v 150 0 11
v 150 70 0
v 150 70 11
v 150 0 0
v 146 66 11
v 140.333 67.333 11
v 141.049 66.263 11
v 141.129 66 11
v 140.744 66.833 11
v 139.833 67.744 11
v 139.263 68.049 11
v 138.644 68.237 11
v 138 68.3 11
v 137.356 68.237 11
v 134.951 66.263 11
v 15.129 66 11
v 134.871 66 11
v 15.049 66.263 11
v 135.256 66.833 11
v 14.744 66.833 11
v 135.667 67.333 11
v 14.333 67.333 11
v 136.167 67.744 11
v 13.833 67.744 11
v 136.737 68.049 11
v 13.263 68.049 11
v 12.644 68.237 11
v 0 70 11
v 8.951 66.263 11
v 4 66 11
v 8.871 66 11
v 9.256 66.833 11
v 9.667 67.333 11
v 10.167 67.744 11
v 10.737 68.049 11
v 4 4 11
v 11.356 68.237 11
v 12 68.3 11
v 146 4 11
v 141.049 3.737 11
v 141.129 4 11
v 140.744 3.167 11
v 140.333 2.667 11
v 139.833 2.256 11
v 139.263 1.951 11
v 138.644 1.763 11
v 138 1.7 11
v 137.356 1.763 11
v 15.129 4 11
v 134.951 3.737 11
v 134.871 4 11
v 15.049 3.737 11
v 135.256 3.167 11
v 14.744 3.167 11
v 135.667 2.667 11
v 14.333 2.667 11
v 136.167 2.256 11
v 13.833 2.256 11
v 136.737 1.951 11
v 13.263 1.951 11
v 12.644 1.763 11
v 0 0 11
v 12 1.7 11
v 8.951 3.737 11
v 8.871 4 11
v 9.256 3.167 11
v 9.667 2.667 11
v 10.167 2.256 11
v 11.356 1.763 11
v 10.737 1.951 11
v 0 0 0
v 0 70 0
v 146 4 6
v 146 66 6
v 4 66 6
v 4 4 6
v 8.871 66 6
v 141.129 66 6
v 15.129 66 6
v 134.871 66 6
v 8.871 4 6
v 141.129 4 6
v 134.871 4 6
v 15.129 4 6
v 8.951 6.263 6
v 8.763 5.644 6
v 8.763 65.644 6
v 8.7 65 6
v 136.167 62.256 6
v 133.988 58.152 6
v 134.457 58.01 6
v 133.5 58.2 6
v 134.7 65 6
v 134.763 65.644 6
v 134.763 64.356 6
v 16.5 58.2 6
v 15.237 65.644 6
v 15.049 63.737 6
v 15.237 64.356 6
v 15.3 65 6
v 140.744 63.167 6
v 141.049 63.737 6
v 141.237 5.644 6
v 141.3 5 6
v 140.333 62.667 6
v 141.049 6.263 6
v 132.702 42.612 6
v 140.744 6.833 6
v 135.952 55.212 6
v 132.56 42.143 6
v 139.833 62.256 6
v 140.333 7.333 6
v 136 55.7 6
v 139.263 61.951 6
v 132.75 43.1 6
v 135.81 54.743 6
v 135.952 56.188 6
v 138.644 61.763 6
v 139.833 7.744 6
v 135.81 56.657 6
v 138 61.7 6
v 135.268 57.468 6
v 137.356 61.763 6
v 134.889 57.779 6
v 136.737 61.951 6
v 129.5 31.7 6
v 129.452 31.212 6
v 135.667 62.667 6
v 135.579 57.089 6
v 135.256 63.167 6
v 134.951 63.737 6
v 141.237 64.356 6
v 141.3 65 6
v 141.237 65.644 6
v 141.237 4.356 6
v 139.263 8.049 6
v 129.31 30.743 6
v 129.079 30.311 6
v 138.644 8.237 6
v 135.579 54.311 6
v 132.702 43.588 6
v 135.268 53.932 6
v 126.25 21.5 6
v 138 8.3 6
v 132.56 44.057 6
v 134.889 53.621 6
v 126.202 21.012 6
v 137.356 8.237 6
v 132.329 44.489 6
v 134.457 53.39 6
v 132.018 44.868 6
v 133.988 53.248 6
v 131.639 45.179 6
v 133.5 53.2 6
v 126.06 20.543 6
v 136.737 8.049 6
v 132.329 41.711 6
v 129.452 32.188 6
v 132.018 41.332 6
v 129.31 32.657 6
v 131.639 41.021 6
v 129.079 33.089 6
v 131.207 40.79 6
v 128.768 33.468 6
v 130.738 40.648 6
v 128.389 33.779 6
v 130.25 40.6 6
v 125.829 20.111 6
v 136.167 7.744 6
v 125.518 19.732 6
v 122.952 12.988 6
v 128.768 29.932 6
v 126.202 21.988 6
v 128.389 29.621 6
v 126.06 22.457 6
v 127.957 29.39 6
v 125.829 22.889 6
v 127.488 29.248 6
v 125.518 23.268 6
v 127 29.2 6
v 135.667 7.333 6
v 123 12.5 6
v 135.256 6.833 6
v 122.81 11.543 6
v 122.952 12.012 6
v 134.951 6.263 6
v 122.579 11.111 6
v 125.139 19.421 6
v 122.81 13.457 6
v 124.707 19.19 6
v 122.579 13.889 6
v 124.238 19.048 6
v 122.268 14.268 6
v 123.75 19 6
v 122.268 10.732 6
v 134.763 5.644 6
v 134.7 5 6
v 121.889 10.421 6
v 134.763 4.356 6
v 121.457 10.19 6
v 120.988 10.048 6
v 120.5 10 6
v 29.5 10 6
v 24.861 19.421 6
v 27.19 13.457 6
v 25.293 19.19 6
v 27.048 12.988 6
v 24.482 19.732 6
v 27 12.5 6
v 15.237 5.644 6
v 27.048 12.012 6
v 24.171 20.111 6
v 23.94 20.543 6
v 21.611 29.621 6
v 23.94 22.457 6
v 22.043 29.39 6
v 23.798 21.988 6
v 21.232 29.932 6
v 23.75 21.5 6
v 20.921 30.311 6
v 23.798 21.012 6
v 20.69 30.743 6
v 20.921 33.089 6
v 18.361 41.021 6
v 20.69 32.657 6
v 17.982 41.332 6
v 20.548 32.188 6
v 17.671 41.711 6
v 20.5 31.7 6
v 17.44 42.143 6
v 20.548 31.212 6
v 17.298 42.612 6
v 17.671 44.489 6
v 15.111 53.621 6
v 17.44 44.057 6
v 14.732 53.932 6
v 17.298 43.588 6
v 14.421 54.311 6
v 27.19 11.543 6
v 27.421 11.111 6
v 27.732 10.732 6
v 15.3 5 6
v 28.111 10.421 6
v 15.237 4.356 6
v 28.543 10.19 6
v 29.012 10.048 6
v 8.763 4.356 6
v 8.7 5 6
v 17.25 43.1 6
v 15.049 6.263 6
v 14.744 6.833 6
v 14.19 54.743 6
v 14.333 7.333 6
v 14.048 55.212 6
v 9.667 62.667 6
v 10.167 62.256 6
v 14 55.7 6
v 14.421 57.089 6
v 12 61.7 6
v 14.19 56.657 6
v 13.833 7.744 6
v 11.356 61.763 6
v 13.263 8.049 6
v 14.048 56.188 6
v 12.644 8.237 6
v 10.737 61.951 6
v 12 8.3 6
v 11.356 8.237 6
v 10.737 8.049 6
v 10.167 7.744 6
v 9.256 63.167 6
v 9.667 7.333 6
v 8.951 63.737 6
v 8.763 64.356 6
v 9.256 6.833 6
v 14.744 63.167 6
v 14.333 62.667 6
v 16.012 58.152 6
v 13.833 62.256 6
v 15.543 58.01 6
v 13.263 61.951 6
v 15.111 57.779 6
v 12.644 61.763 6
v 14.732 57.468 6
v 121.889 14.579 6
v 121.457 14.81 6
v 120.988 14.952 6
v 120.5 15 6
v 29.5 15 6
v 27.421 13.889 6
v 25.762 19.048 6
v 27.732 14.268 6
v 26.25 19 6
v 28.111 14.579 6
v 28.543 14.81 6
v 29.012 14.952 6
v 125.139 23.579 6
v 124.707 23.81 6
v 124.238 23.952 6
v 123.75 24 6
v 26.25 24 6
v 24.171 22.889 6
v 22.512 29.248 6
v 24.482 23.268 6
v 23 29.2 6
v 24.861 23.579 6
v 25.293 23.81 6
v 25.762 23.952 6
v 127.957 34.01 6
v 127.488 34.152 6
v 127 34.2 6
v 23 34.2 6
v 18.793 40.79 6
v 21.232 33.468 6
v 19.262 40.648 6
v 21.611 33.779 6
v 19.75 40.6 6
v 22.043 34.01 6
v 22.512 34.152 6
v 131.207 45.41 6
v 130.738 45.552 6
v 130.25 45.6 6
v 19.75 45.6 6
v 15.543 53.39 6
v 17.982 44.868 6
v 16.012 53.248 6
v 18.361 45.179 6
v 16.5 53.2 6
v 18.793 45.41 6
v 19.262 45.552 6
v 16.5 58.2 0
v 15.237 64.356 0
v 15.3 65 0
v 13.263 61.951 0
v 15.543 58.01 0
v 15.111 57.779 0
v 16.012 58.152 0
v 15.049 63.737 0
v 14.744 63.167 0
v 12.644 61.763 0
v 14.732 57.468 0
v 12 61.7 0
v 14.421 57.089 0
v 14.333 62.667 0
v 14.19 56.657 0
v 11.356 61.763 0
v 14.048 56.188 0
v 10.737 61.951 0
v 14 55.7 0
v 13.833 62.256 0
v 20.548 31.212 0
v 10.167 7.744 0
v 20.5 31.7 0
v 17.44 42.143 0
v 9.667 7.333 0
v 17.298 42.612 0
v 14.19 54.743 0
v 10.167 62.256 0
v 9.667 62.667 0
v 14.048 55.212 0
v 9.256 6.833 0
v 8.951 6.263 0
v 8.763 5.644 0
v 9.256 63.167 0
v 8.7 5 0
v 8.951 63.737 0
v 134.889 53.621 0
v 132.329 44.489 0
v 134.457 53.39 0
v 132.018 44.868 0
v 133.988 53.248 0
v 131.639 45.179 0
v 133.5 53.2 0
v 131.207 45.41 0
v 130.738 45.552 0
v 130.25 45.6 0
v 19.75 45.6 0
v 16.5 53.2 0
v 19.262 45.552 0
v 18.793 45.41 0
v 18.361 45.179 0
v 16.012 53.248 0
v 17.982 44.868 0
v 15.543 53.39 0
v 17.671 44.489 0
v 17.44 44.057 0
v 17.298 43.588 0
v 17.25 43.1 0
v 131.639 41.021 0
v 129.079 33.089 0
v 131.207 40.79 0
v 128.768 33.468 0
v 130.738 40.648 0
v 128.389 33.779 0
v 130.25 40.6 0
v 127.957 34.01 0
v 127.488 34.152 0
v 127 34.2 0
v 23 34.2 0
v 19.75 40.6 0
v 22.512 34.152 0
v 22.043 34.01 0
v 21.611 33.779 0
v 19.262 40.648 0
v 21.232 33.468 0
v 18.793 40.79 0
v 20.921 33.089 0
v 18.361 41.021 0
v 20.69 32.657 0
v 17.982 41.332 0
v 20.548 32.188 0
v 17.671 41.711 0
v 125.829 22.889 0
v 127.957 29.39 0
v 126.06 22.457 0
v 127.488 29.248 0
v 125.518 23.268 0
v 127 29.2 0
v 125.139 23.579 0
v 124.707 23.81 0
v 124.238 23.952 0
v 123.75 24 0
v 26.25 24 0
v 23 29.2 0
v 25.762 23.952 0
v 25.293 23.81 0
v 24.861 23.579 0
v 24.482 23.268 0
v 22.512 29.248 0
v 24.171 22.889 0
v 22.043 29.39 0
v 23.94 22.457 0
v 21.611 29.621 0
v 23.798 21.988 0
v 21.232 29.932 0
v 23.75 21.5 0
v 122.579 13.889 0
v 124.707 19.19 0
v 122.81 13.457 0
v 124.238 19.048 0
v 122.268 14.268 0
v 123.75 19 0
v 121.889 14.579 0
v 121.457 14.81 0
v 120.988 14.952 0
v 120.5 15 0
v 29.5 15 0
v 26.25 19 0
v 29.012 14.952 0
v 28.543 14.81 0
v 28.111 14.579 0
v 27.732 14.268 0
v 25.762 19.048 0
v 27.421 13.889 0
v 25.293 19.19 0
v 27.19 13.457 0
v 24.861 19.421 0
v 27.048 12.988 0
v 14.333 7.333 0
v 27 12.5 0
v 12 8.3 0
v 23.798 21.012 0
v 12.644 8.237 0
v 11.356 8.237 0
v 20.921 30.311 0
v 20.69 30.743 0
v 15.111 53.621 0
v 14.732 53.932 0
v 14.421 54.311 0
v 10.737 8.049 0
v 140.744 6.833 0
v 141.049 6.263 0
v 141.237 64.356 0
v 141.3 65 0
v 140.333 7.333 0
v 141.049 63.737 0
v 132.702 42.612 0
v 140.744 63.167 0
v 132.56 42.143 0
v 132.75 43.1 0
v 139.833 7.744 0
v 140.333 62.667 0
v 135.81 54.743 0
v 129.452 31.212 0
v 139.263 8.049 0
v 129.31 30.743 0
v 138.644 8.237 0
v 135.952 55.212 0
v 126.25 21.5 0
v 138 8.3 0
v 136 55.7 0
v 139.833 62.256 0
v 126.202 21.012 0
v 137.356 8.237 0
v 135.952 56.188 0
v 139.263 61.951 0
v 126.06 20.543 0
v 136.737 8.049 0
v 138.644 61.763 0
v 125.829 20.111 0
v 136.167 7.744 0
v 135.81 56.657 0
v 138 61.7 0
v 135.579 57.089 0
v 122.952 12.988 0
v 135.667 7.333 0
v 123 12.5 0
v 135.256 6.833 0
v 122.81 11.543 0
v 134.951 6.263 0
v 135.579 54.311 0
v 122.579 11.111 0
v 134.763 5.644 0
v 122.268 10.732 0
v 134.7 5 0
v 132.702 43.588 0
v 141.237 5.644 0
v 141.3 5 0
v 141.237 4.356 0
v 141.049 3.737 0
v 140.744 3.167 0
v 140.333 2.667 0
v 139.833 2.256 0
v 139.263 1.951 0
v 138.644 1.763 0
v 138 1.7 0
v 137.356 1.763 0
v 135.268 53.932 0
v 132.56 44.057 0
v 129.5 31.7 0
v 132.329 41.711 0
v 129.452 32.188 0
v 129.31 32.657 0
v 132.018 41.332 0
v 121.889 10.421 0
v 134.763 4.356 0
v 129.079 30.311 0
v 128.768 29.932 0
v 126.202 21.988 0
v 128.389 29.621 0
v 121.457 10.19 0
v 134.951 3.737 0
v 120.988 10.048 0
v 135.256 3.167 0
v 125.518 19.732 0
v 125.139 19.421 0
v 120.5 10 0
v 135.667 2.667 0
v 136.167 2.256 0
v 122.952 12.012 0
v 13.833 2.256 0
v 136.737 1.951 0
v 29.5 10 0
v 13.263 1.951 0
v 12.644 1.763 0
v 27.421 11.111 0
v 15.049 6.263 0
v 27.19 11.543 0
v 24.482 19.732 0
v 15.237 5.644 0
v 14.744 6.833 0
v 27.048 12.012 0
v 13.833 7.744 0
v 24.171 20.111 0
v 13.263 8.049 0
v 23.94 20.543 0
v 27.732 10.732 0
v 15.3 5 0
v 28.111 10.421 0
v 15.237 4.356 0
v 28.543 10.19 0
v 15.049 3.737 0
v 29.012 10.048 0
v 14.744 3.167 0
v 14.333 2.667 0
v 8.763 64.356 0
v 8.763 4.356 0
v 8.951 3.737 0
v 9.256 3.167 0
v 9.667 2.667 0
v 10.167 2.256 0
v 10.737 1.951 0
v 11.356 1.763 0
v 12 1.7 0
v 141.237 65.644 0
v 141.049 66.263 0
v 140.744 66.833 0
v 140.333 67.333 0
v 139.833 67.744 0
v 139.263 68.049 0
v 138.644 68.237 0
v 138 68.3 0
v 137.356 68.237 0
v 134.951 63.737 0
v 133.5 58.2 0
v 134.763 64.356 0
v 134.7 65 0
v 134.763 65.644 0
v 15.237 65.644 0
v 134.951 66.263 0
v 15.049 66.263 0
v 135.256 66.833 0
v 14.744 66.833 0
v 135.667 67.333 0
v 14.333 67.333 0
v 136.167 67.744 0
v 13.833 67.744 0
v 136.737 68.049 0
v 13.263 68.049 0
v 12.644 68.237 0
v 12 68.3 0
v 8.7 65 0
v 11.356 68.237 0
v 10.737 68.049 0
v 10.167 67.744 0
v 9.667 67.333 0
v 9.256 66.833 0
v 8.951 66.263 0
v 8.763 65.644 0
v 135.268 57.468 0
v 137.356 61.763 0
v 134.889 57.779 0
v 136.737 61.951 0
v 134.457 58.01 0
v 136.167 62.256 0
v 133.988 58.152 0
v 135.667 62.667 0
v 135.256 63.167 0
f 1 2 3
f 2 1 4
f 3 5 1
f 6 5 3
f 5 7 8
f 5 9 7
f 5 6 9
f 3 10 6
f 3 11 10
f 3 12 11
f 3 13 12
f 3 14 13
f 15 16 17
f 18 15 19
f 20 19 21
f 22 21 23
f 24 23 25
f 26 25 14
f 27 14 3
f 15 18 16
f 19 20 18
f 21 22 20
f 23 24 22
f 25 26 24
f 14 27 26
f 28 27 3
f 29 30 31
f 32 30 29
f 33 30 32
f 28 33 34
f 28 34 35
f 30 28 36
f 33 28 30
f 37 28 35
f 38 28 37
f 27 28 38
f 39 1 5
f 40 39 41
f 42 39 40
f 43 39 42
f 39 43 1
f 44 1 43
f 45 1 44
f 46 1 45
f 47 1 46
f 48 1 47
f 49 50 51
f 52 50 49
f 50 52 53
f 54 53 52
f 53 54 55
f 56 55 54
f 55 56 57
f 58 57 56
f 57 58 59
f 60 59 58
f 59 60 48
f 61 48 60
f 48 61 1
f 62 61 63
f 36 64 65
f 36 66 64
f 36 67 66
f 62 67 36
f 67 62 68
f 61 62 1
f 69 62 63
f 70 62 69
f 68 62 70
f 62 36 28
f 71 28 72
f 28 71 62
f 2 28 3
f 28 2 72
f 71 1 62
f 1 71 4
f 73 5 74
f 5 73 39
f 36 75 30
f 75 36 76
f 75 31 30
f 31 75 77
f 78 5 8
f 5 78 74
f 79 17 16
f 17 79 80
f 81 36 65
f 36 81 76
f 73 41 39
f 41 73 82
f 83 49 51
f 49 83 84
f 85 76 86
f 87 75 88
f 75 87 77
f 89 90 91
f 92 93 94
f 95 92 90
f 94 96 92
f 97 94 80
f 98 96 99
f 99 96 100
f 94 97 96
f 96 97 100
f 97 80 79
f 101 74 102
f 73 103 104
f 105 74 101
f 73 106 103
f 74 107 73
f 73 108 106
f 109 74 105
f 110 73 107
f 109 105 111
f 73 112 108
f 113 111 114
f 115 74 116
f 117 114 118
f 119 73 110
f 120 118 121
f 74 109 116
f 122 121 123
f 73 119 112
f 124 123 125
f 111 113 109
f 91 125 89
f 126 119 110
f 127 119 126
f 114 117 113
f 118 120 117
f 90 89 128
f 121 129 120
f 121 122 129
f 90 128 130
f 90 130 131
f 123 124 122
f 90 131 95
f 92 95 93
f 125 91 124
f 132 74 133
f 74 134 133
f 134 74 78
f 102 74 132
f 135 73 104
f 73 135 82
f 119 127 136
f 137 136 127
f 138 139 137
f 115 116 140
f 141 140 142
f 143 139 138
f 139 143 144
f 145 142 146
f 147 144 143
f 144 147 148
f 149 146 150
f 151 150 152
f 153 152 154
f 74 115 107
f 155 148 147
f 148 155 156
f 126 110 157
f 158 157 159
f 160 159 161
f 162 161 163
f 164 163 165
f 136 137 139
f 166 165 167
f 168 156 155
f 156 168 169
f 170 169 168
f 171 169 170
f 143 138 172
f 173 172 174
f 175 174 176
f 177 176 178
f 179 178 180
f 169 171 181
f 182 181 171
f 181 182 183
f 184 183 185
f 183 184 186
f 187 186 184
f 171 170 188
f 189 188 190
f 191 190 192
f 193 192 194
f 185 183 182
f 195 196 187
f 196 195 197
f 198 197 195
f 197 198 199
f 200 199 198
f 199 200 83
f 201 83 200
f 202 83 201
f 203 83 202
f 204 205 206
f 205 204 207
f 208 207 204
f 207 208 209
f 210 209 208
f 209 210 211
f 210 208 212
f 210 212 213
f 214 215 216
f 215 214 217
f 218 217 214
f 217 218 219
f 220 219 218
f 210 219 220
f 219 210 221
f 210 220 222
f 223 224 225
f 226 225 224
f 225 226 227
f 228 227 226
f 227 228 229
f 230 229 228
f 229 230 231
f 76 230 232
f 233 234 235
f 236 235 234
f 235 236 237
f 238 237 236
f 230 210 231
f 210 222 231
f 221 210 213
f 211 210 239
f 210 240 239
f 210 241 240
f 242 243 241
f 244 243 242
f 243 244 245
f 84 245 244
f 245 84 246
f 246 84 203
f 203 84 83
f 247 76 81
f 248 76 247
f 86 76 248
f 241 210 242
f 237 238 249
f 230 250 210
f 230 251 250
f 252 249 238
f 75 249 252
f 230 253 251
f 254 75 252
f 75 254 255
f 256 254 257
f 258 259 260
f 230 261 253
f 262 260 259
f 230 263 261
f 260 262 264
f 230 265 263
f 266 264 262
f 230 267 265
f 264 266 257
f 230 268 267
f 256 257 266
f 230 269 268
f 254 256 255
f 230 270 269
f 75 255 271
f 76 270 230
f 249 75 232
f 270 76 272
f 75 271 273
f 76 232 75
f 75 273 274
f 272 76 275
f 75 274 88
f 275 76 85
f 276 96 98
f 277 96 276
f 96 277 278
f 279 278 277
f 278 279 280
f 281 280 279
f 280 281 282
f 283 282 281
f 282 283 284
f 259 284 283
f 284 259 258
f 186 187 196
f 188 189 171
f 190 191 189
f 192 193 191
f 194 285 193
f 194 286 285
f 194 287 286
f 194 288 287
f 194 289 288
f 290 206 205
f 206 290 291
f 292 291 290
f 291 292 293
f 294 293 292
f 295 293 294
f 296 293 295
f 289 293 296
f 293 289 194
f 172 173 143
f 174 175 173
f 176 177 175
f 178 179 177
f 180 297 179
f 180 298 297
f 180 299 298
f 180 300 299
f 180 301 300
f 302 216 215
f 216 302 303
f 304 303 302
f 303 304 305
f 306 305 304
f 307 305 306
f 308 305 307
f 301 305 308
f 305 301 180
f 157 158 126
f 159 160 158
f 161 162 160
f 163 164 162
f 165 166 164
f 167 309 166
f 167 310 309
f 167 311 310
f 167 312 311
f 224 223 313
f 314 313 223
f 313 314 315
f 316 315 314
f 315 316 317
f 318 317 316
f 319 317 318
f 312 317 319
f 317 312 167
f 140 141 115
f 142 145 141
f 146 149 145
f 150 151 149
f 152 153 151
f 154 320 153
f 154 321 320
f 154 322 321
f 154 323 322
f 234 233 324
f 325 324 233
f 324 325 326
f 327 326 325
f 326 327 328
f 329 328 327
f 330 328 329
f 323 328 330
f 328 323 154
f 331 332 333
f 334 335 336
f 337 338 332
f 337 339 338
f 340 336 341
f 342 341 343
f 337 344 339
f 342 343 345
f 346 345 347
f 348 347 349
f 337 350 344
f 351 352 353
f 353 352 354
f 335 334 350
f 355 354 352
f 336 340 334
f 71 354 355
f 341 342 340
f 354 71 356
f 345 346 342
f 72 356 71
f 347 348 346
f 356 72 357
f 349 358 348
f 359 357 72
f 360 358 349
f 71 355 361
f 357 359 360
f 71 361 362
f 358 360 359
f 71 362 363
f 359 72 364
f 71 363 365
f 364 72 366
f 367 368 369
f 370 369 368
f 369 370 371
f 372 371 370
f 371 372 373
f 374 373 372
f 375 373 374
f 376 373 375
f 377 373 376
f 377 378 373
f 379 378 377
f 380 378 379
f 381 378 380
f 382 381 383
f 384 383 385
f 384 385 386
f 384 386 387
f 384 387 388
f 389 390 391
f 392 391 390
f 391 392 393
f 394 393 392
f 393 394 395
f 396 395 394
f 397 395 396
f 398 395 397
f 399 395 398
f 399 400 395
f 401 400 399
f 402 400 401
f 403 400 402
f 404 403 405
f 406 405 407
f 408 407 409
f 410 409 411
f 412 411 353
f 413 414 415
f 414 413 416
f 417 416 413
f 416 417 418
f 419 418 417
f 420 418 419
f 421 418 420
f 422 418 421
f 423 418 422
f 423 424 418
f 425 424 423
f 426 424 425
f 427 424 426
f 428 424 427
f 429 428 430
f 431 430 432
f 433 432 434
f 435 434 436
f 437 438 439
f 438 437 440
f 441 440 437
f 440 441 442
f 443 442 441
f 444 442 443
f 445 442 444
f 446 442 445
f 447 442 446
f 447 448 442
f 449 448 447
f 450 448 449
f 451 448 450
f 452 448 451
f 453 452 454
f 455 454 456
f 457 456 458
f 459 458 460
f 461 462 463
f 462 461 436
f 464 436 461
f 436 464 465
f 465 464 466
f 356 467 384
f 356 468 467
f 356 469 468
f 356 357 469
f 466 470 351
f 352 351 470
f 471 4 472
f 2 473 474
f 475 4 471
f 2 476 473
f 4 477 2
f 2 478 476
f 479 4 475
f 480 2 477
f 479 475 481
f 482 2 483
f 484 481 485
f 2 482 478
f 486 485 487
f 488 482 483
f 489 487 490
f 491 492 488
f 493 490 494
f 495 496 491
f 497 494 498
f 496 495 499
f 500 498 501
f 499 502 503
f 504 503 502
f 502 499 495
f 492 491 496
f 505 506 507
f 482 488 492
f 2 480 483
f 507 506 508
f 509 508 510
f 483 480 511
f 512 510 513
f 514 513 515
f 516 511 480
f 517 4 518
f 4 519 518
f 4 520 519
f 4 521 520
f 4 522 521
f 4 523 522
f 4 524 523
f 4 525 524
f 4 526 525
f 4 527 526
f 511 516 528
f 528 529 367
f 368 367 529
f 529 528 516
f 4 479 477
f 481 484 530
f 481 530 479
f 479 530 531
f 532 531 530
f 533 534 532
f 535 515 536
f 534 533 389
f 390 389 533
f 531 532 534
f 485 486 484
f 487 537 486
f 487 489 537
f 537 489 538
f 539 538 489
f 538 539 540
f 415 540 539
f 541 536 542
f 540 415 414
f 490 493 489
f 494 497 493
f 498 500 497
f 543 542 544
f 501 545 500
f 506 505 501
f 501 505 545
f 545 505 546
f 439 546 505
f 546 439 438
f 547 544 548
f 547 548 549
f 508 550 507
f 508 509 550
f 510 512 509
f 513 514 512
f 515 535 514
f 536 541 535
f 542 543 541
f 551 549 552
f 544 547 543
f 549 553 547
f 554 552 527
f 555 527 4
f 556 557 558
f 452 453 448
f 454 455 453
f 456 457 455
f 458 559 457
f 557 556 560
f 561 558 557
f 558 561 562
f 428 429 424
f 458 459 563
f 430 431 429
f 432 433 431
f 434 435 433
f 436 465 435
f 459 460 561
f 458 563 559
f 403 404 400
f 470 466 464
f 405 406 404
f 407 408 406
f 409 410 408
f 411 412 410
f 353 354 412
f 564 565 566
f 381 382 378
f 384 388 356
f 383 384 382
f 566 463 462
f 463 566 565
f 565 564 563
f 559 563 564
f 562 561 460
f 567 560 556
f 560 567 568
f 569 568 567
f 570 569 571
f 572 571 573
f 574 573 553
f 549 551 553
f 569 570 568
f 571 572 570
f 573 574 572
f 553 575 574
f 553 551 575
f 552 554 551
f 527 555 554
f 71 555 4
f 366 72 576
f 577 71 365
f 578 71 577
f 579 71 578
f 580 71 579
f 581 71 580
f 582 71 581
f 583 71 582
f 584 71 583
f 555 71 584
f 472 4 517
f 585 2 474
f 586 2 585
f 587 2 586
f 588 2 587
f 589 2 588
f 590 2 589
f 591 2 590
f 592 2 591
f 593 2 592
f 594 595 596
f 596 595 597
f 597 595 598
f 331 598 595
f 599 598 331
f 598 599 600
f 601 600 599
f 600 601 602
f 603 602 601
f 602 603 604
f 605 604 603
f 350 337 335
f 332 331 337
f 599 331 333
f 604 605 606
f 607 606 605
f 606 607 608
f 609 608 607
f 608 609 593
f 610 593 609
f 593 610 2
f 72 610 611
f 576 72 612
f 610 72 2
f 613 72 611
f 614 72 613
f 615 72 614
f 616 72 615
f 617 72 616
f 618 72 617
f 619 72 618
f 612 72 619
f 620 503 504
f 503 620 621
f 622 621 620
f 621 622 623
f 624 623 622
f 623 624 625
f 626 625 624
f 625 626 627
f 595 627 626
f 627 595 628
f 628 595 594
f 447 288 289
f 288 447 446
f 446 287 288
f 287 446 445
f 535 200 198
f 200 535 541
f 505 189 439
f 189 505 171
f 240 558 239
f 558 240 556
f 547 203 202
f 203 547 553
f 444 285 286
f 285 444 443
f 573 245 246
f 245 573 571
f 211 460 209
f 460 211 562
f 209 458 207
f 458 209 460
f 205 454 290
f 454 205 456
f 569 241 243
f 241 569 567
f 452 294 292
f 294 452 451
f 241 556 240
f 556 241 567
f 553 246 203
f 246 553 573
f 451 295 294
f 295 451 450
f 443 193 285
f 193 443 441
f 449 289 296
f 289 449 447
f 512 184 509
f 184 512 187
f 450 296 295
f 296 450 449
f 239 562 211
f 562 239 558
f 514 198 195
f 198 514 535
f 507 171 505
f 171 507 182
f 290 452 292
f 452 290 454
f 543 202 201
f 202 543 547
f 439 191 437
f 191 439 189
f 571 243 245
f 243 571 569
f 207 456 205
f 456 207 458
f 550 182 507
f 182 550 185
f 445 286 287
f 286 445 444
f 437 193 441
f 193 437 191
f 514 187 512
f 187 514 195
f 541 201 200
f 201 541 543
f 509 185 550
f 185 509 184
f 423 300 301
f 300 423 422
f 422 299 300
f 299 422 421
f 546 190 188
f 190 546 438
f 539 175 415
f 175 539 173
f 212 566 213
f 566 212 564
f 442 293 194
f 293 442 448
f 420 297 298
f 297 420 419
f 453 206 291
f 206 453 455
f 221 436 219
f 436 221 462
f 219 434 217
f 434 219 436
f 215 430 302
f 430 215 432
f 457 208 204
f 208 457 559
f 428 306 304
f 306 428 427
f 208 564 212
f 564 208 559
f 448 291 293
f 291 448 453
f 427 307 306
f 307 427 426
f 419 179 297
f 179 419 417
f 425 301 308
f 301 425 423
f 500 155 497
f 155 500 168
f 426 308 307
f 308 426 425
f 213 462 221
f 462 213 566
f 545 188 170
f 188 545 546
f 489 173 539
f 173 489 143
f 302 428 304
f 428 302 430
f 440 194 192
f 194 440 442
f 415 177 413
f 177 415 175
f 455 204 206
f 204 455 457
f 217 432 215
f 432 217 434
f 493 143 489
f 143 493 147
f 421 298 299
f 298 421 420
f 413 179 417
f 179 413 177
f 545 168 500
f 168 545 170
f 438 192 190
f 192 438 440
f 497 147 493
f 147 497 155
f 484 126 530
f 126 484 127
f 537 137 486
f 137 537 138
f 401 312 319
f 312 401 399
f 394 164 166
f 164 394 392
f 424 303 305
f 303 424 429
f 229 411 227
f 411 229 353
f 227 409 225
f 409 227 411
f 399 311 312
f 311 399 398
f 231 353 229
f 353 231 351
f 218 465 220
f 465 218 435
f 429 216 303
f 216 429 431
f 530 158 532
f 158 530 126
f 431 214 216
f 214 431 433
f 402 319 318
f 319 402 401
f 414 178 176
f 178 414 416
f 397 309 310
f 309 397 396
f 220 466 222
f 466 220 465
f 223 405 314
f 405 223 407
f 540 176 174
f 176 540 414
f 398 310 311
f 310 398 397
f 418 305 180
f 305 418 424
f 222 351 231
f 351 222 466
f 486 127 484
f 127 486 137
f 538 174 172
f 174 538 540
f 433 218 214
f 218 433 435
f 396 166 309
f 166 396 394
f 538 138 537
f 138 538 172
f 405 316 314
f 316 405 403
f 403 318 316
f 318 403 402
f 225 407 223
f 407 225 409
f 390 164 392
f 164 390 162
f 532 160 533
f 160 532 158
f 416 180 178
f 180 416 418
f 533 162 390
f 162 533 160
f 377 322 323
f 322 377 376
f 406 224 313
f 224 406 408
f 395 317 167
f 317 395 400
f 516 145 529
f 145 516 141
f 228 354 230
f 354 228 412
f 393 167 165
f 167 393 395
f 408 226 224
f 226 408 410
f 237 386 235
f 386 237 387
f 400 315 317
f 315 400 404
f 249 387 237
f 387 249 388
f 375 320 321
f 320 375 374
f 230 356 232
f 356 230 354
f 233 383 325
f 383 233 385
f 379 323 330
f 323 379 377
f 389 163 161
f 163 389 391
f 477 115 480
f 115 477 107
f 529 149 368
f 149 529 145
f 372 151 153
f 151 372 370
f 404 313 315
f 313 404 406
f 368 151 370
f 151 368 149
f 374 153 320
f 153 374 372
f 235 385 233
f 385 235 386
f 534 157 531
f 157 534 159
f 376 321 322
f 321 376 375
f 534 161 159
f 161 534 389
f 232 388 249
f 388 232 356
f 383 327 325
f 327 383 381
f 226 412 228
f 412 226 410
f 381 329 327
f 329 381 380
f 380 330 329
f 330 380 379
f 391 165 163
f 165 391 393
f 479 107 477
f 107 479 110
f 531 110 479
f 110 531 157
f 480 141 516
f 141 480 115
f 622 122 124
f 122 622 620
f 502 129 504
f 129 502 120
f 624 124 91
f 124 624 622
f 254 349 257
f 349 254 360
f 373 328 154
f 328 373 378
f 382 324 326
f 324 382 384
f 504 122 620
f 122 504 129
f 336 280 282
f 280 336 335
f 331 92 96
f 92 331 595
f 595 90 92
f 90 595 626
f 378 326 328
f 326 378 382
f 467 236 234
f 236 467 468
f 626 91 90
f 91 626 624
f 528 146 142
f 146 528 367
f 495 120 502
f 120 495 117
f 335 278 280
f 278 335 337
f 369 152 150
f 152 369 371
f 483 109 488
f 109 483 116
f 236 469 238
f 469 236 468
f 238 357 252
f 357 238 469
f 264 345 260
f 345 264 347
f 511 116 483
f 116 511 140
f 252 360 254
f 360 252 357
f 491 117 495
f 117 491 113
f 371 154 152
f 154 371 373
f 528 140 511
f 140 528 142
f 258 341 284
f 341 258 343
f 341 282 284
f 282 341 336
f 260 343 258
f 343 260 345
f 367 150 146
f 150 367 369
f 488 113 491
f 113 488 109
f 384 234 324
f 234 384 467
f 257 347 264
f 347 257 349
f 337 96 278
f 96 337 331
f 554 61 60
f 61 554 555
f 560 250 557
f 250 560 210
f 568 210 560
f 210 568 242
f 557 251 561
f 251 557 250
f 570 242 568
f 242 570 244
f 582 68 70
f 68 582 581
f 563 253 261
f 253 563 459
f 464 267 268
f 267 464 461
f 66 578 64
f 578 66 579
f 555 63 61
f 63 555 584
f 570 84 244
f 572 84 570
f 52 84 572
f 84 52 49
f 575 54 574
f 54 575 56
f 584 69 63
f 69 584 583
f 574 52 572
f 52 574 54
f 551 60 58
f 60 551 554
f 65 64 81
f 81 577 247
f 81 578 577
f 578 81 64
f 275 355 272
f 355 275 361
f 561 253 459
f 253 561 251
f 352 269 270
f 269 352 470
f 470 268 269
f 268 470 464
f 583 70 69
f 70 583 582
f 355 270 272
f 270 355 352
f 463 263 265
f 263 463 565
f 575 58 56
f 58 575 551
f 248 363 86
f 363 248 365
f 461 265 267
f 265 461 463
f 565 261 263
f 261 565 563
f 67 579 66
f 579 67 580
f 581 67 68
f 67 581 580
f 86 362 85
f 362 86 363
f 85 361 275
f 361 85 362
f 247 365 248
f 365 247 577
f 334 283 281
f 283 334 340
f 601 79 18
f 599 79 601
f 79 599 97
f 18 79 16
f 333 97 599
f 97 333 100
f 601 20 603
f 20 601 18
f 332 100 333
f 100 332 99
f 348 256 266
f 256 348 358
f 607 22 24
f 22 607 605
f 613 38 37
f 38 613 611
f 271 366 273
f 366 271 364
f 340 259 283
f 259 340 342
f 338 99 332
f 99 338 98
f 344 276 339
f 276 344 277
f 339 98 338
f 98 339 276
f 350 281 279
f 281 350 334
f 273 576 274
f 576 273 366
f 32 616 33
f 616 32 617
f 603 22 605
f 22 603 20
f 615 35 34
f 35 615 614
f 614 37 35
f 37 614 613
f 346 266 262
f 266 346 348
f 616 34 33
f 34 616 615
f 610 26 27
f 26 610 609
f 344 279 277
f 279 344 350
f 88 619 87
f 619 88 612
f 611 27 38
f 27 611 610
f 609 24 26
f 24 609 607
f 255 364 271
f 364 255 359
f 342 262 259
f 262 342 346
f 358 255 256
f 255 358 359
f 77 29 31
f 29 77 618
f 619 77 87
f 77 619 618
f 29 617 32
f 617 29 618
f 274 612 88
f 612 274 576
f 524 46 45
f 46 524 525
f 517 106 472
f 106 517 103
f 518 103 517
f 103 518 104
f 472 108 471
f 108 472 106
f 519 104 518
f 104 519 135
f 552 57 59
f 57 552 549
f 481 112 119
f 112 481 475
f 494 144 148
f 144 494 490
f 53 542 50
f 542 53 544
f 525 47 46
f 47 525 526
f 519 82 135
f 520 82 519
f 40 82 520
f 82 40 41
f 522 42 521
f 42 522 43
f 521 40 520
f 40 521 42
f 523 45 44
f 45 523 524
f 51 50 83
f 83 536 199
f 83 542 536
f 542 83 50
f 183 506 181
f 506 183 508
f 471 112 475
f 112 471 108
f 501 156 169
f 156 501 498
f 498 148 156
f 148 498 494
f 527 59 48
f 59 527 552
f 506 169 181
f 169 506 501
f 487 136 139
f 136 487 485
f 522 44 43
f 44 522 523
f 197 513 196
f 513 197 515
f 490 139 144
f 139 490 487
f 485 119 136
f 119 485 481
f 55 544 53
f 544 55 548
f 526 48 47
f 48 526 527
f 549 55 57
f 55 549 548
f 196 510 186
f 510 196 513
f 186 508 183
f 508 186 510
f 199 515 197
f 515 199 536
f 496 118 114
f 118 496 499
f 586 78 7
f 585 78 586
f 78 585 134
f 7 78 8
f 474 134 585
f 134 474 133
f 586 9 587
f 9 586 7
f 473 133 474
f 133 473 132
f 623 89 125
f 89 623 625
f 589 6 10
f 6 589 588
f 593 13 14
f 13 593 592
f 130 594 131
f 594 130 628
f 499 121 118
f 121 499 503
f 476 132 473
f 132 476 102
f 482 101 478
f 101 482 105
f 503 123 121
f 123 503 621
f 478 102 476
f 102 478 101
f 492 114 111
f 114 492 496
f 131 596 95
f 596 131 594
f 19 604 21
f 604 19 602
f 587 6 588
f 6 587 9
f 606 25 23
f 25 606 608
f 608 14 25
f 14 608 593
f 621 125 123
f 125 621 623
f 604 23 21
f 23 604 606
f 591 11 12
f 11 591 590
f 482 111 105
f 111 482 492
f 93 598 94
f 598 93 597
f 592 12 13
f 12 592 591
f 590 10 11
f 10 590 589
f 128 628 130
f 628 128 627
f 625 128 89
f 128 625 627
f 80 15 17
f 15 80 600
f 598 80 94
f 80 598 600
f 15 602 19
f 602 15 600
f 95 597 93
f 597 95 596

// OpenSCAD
$fn = 32;

// ----------------------------------------------------------------------
// Slotted panel: 150 x 70 mm, 5 рядов of slots
// ----------------------------------------------------------------------

// --- parameters (mm) ---
panel_w = 150;            // panel width
panel_d = 70;             // panel depth
thick = 6;                // panel thickness
slot_w = 5;               // slot width
pitch0 = 9;               // first row pitch
pitch_step = 1.2;         // pitch increase per row
margin = 10;              // margin around the slot field
rows = 5;                 // number of slot rows
mount_d = 6.6;            // mounting holes
mount_x = 63;             // mounting hole offset
rim_h = 11;               // rim height
rim_t = 4;                // rim wall thickness

difference() {
  union() {
    cube([panel_w, panel_d, thick]);
    translate([0, 0, thick - 1]) difference() {
      cube([panel_w, panel_d, rim_h - thick + 1]);
      translate([rim_t, rim_t, -2.5]) cube([panel_w - 2 * rim_t, panel_d - 2 * rim_t, rim_h - thick + 6]);
    }
  }
  /* slot rows: stadium shaped cutters, 2.5 mm clear of both faces */
  /* row 0: pitch 9, length 91 */
  hull() {
    translate([29.5, 12.5, -2.5]) cylinder(h = thick + 5, d = slot_w);
    translate([120.5, 12.5, -2.5]) cylinder(h = thick + 5, d = slot_w);
  }
  /* row 1: pitch 10.2, length 97.5 */
  hull() {
    translate([26.25, 21.5, -2.5]) cylinder(h = thick + 5, d = slot_w);
    translate([123.75, 21.5, -2.5]) cylinder(h = thick + 5, d = slot_w);
  }
  /* row 2: pitch 11.4, length 104 */
  hull() {
    translate([23, 31.7, -2.5]) cylinder(h = thick + 5, d = slot_w);
    translate([127, 31.7, -2.5]) cylinder(h = thick + 5, d = slot_w);
  }
  /* row 3: pitch 12.6, length 110.5 */
  hull() {
    translate([19.75, 43.1, -2.5]) cylinder(h = thick + 5, d = slot_w);
    translate([130.25, 43.1, -2.5]) cylinder(h = thick + 5, d = slot_w);
  }
  /* row 4: pitch 13.8, length 117 */
  hull() {
    translate([16.5, 55.7, -2.5]) cylinder(h = thick + 5, d = slot_w);
    translate([133.5, 55.7, -2.5]) cylinder(h = thick + 5, d = slot_w);
  }
  translate([12, 5, -2.5]) cylinder(h = 16, d = mount_d);
  translate([12, 65, -2.5]) cylinder(h = 16, d = mount_d);
  translate([138, 5, -2.5]) cylinder(h = 16, d = mount_d);
  translate([138, 65, -2.5]) cylinder(h = 16, d = mount_d);
}
